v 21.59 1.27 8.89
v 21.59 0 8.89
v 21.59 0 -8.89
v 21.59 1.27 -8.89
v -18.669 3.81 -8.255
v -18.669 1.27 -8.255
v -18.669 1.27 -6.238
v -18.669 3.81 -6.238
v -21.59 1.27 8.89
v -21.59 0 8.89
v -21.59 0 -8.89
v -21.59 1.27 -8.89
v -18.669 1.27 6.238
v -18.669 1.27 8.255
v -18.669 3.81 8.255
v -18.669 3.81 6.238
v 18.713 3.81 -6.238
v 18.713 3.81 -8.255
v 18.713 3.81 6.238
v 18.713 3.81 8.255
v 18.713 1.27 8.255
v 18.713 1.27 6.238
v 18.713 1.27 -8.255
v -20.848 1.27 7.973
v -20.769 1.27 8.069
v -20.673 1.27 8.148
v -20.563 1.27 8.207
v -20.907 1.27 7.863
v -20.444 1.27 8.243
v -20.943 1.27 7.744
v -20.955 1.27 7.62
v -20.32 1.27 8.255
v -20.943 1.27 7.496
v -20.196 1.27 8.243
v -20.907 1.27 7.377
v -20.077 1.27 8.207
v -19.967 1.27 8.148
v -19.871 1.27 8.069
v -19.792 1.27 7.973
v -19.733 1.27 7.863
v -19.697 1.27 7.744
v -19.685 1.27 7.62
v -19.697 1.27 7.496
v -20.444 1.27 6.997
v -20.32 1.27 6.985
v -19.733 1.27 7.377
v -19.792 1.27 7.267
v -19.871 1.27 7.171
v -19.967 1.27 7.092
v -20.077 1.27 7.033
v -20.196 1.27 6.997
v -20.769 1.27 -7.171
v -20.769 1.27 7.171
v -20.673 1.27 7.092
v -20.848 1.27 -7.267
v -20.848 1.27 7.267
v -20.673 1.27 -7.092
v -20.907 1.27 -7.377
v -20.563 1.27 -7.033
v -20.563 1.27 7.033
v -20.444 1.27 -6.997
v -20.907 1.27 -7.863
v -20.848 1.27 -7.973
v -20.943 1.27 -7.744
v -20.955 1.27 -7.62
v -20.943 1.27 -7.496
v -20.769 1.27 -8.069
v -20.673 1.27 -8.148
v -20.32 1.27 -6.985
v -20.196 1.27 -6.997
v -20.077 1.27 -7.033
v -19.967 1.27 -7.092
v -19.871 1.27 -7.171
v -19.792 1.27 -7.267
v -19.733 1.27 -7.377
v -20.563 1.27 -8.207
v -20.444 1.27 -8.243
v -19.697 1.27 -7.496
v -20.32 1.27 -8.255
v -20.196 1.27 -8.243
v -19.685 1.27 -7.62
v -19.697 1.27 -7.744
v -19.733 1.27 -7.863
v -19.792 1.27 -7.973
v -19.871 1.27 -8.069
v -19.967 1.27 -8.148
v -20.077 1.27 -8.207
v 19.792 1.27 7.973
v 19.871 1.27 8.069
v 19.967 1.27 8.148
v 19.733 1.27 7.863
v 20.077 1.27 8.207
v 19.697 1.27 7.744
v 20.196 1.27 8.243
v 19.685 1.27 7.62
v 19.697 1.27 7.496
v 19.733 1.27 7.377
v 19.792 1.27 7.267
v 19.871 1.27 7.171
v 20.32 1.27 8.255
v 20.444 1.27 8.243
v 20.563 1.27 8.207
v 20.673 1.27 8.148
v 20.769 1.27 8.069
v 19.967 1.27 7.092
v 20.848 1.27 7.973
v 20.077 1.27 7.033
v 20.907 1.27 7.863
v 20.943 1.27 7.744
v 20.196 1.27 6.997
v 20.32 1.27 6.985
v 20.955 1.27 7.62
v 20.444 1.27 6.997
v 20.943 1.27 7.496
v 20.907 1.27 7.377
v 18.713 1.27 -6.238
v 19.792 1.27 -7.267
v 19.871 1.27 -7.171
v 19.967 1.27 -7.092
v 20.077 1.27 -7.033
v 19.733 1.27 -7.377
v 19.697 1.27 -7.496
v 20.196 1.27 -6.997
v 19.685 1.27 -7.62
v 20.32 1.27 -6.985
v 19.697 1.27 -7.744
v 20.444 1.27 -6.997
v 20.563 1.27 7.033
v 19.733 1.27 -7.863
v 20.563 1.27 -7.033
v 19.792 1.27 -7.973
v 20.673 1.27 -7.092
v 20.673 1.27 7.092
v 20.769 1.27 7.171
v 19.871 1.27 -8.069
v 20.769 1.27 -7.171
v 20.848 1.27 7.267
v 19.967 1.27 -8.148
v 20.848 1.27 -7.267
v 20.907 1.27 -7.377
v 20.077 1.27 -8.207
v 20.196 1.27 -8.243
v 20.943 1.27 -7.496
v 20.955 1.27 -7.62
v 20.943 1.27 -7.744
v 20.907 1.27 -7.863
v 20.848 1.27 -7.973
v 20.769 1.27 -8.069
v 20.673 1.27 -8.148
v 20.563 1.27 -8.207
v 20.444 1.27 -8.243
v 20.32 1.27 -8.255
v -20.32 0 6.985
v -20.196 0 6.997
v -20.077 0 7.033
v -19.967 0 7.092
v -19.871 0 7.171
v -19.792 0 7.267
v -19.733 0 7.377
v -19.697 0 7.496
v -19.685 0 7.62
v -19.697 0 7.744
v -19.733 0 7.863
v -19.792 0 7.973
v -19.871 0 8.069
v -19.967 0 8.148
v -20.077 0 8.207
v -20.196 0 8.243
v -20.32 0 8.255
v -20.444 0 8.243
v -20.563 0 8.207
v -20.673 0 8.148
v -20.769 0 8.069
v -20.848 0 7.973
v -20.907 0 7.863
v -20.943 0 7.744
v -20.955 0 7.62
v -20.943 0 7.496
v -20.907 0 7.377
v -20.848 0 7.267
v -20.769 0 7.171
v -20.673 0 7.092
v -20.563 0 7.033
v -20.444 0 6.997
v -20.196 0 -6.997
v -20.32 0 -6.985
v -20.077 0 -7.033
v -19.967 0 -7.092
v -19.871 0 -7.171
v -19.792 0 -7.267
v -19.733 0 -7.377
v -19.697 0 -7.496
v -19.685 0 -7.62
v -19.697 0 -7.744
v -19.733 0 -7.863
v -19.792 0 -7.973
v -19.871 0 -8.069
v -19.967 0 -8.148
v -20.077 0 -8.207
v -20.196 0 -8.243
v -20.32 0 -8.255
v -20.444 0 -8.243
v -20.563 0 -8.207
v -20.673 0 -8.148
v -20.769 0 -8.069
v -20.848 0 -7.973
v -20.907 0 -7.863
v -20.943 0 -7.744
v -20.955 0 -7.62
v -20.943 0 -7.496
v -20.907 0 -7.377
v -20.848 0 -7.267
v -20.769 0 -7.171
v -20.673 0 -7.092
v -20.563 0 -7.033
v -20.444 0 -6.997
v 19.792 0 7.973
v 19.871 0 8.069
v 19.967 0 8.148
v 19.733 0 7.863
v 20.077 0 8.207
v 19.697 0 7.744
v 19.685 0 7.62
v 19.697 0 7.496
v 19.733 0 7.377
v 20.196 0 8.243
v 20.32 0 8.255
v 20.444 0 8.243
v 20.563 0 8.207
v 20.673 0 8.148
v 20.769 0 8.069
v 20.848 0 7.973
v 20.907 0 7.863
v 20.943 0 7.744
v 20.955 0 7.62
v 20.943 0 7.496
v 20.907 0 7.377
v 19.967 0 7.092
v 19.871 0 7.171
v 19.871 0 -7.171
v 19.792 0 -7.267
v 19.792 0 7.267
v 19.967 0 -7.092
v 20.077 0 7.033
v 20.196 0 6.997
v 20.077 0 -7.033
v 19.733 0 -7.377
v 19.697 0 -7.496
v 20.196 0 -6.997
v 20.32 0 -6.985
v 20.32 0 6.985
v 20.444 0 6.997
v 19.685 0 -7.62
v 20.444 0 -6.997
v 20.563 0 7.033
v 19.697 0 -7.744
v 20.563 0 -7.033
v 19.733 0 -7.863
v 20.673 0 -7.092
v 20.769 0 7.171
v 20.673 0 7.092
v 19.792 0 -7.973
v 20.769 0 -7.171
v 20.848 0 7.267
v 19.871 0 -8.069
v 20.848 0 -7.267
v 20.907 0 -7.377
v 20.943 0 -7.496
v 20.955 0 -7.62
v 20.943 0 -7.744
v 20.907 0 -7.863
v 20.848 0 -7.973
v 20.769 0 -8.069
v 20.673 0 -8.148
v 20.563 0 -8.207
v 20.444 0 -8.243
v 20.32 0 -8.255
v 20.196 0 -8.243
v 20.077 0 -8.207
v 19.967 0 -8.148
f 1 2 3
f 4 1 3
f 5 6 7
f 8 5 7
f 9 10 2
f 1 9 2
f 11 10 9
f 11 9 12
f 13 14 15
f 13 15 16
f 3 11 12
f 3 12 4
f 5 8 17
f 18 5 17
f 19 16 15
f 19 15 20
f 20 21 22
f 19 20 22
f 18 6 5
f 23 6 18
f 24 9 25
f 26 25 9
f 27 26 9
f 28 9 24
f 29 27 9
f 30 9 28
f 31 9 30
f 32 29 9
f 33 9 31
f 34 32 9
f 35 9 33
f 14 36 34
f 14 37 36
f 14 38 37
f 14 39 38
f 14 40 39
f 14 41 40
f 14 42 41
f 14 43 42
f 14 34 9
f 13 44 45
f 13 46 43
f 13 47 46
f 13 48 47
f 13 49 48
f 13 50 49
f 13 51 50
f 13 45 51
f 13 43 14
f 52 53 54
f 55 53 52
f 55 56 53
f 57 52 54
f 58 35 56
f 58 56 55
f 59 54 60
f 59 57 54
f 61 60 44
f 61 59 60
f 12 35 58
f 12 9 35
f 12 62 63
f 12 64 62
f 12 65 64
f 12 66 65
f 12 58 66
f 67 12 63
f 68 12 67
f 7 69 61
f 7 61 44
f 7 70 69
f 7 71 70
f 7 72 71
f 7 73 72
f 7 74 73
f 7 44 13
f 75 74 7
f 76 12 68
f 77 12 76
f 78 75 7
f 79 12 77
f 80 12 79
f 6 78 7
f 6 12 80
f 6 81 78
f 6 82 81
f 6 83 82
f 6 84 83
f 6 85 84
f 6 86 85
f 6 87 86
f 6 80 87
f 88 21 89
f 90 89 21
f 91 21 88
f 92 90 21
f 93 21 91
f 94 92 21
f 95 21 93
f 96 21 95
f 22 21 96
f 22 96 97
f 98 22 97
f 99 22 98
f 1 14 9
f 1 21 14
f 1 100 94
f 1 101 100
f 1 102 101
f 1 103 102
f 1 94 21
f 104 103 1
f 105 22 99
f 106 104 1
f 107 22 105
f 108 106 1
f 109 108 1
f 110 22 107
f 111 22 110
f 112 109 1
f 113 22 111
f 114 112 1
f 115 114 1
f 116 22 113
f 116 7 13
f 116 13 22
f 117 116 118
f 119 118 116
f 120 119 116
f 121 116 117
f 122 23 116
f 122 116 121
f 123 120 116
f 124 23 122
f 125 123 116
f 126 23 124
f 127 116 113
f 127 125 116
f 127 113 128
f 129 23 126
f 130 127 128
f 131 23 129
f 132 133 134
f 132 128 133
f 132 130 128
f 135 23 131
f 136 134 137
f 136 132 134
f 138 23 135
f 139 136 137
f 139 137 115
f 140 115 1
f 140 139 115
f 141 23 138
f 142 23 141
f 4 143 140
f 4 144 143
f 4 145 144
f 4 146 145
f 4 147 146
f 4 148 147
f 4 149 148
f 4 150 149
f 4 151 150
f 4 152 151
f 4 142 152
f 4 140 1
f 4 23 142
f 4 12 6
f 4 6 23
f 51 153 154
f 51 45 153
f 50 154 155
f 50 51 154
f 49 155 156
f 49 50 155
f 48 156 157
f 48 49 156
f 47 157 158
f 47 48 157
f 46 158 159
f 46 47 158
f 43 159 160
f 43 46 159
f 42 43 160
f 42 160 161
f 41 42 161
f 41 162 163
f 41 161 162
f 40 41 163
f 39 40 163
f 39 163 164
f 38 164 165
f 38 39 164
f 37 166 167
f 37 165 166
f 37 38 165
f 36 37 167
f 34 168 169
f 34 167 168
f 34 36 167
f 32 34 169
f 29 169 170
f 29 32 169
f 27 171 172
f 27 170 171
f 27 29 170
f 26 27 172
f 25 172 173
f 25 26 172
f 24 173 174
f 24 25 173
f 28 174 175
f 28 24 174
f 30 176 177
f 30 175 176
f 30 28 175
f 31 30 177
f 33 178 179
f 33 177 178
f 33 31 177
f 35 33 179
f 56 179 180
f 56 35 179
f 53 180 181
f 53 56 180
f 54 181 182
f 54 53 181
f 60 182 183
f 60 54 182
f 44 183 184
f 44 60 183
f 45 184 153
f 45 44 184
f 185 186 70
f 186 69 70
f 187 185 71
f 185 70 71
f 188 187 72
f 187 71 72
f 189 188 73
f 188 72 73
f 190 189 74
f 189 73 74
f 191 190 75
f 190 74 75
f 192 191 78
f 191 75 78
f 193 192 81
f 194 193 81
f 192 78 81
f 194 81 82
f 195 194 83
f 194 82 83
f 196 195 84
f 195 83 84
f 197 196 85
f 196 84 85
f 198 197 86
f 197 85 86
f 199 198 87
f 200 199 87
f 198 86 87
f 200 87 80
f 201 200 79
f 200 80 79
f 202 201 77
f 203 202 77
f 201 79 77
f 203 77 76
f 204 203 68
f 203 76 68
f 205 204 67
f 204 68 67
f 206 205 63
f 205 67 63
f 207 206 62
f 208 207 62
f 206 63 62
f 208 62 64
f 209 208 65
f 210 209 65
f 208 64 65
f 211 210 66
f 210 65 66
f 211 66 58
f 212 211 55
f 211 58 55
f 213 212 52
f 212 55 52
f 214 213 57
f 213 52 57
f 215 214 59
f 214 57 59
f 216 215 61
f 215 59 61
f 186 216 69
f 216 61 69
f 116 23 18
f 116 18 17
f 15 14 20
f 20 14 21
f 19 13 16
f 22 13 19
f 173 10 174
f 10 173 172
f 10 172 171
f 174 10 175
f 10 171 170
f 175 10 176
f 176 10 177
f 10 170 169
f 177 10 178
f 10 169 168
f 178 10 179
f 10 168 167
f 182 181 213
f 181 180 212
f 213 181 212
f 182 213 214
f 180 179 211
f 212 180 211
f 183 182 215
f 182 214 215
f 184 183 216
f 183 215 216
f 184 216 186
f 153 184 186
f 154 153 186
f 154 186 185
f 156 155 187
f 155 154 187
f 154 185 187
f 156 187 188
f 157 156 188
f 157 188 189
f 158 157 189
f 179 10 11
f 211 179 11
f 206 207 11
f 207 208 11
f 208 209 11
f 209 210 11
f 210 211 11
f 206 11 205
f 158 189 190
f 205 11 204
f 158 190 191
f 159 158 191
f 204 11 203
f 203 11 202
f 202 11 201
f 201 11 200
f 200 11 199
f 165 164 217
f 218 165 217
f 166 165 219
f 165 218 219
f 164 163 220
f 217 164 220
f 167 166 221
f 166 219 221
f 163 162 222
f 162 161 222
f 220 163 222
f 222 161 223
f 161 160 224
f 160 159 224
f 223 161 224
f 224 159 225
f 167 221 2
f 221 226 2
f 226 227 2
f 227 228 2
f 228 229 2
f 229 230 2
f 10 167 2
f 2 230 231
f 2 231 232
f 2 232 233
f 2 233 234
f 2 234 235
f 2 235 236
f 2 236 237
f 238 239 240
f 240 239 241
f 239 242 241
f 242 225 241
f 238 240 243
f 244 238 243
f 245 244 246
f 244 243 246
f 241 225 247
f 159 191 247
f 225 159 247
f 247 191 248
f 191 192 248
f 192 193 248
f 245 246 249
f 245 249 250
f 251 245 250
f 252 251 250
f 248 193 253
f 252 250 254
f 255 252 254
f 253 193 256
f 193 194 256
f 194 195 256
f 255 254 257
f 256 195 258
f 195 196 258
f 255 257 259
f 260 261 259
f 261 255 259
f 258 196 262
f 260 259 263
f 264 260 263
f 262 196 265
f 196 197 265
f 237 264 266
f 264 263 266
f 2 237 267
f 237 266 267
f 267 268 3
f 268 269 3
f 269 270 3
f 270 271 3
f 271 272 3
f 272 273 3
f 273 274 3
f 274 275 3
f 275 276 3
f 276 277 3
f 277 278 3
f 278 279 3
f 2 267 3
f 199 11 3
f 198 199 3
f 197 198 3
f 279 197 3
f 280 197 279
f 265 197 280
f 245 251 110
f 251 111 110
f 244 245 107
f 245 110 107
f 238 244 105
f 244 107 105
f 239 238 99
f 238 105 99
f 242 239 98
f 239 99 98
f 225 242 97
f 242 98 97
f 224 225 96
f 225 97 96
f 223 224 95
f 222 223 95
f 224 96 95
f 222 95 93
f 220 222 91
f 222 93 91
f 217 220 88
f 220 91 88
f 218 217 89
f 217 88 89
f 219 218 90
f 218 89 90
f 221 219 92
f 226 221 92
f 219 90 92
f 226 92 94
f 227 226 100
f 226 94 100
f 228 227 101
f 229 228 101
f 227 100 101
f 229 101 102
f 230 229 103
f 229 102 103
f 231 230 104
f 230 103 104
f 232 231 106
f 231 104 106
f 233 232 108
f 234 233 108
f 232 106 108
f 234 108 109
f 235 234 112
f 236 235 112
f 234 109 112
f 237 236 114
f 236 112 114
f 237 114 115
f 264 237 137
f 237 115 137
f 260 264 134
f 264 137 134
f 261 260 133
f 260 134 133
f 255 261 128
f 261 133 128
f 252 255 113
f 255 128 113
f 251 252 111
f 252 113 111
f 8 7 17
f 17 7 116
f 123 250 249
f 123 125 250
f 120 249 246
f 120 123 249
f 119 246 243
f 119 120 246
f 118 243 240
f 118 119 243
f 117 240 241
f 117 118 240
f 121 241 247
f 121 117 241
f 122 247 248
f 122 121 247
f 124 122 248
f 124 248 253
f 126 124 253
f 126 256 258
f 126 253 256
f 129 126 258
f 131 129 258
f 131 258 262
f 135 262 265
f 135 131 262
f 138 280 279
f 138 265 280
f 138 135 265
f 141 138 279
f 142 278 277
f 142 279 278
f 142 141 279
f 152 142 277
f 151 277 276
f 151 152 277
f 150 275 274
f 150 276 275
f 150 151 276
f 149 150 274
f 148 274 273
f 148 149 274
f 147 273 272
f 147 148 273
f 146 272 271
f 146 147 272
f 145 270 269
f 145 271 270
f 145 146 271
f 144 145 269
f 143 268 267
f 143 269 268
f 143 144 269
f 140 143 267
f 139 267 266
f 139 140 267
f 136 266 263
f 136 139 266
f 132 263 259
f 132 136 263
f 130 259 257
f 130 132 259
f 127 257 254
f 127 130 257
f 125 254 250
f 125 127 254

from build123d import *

# Parameters (mm, degrees)
SKETCH2_W                                  = 43.18
SKETCH2_H                                  = 17.78
BOSS_EXTRUDE1_DEPTH                        = 1.27
SKETCH3_R                                  = 0.635
CUT_EXTRUDE1_DEPTH                         = 24.383179852
MIRROR1_AT_THE_SECOND_PLANE_COPY_1_SKETC_R = 0.635
MIRROR1_AT_THE_SECOND_PLANE_COPY_1_DEPTH   = 24.383179852
SKETCH4_W                                  = 37.381103683
SKETCH4_H                                  = 2.016737313
BOSS_EXTRUDE2_DEPTH                        = 2.54


with BuildPart() as part:
    # Sketch2 → Boss-Extrude1 (new body)
    with BuildSketch(Plane(origin=(0, 0, 0), x_dir=(1, 0, 0), z_dir=(0, 1, 0))):
        Rectangle(SKETCH2_W, SKETCH2_H)
    extrude(amount=BOSS_EXTRUDE1_DEPTH)

    # Sketch3 → Cut-Extrude1 (cut, symmetric)
    with BuildSketch(Plane(origin=(0, 1.27, 0), x_dir=(1, 0, 0), z_dir=(0, 1, 0))):
        with Locations(Location((-20.32, 7.62, 0), (0, 0, 270))):
            Circle(SKETCH3_R)
    cut_extrude1 = extrude(amount=CUT_EXTRUDE1_DEPTH, both=True, mode=Mode.SUBTRACT)

    # Mirror1: Cut-Extrude1 across plane
    add(cut_extrude1.mirror(Plane(origin=(0, 0, 0), x_dir=(0, 0, 1), z_dir=(1, 0, 0))), mode=Mode.SUBTRACT)

    # Mirror1 at the second plane: Cut-Extrude1 across plane
    add(cut_extrude1.mirror(Plane.XY), mode=Mode.SUBTRACT)

    # Mirror1 at the second plane copy 1 sketc → Mirror1 at the second plane copy 1 (cut, symmetric)
    with BuildSketch(Plane(origin=(0, 1.27, 0), x_dir=(-1, 0, 0), z_dir=(0, 1, 0))):
        with Locations(Location((-20.32, 7.62, 0), (0, 0, 270))):
            Circle(MIRROR1_AT_THE_SECOND_PLANE_COPY_1_SKETC_R)
    extrude(amount=MIRROR1_AT_THE_SECOND_PLANE_COPY_1_DEPTH, both=True, mode=Mode.SUBTRACT)

    # Sketch4 → Boss-Extrude2 (add)
    with BuildSketch(Plane(origin=(0, 1.27, 0), x_dir=(1, 0, 0), z_dir=(0, 1, 0))):
        with Locations((0.021963045, -7.246631344)):
            Rectangle(SKETCH4_W, SKETCH4_H)
    boss_extrude2 = extrude(amount=BOSS_EXTRUDE2_DEPTH)

    # Mirror2: Boss-Extrude2 across plane
    add(boss_extrude2.mirror(Plane.XY))


solid = part.part
